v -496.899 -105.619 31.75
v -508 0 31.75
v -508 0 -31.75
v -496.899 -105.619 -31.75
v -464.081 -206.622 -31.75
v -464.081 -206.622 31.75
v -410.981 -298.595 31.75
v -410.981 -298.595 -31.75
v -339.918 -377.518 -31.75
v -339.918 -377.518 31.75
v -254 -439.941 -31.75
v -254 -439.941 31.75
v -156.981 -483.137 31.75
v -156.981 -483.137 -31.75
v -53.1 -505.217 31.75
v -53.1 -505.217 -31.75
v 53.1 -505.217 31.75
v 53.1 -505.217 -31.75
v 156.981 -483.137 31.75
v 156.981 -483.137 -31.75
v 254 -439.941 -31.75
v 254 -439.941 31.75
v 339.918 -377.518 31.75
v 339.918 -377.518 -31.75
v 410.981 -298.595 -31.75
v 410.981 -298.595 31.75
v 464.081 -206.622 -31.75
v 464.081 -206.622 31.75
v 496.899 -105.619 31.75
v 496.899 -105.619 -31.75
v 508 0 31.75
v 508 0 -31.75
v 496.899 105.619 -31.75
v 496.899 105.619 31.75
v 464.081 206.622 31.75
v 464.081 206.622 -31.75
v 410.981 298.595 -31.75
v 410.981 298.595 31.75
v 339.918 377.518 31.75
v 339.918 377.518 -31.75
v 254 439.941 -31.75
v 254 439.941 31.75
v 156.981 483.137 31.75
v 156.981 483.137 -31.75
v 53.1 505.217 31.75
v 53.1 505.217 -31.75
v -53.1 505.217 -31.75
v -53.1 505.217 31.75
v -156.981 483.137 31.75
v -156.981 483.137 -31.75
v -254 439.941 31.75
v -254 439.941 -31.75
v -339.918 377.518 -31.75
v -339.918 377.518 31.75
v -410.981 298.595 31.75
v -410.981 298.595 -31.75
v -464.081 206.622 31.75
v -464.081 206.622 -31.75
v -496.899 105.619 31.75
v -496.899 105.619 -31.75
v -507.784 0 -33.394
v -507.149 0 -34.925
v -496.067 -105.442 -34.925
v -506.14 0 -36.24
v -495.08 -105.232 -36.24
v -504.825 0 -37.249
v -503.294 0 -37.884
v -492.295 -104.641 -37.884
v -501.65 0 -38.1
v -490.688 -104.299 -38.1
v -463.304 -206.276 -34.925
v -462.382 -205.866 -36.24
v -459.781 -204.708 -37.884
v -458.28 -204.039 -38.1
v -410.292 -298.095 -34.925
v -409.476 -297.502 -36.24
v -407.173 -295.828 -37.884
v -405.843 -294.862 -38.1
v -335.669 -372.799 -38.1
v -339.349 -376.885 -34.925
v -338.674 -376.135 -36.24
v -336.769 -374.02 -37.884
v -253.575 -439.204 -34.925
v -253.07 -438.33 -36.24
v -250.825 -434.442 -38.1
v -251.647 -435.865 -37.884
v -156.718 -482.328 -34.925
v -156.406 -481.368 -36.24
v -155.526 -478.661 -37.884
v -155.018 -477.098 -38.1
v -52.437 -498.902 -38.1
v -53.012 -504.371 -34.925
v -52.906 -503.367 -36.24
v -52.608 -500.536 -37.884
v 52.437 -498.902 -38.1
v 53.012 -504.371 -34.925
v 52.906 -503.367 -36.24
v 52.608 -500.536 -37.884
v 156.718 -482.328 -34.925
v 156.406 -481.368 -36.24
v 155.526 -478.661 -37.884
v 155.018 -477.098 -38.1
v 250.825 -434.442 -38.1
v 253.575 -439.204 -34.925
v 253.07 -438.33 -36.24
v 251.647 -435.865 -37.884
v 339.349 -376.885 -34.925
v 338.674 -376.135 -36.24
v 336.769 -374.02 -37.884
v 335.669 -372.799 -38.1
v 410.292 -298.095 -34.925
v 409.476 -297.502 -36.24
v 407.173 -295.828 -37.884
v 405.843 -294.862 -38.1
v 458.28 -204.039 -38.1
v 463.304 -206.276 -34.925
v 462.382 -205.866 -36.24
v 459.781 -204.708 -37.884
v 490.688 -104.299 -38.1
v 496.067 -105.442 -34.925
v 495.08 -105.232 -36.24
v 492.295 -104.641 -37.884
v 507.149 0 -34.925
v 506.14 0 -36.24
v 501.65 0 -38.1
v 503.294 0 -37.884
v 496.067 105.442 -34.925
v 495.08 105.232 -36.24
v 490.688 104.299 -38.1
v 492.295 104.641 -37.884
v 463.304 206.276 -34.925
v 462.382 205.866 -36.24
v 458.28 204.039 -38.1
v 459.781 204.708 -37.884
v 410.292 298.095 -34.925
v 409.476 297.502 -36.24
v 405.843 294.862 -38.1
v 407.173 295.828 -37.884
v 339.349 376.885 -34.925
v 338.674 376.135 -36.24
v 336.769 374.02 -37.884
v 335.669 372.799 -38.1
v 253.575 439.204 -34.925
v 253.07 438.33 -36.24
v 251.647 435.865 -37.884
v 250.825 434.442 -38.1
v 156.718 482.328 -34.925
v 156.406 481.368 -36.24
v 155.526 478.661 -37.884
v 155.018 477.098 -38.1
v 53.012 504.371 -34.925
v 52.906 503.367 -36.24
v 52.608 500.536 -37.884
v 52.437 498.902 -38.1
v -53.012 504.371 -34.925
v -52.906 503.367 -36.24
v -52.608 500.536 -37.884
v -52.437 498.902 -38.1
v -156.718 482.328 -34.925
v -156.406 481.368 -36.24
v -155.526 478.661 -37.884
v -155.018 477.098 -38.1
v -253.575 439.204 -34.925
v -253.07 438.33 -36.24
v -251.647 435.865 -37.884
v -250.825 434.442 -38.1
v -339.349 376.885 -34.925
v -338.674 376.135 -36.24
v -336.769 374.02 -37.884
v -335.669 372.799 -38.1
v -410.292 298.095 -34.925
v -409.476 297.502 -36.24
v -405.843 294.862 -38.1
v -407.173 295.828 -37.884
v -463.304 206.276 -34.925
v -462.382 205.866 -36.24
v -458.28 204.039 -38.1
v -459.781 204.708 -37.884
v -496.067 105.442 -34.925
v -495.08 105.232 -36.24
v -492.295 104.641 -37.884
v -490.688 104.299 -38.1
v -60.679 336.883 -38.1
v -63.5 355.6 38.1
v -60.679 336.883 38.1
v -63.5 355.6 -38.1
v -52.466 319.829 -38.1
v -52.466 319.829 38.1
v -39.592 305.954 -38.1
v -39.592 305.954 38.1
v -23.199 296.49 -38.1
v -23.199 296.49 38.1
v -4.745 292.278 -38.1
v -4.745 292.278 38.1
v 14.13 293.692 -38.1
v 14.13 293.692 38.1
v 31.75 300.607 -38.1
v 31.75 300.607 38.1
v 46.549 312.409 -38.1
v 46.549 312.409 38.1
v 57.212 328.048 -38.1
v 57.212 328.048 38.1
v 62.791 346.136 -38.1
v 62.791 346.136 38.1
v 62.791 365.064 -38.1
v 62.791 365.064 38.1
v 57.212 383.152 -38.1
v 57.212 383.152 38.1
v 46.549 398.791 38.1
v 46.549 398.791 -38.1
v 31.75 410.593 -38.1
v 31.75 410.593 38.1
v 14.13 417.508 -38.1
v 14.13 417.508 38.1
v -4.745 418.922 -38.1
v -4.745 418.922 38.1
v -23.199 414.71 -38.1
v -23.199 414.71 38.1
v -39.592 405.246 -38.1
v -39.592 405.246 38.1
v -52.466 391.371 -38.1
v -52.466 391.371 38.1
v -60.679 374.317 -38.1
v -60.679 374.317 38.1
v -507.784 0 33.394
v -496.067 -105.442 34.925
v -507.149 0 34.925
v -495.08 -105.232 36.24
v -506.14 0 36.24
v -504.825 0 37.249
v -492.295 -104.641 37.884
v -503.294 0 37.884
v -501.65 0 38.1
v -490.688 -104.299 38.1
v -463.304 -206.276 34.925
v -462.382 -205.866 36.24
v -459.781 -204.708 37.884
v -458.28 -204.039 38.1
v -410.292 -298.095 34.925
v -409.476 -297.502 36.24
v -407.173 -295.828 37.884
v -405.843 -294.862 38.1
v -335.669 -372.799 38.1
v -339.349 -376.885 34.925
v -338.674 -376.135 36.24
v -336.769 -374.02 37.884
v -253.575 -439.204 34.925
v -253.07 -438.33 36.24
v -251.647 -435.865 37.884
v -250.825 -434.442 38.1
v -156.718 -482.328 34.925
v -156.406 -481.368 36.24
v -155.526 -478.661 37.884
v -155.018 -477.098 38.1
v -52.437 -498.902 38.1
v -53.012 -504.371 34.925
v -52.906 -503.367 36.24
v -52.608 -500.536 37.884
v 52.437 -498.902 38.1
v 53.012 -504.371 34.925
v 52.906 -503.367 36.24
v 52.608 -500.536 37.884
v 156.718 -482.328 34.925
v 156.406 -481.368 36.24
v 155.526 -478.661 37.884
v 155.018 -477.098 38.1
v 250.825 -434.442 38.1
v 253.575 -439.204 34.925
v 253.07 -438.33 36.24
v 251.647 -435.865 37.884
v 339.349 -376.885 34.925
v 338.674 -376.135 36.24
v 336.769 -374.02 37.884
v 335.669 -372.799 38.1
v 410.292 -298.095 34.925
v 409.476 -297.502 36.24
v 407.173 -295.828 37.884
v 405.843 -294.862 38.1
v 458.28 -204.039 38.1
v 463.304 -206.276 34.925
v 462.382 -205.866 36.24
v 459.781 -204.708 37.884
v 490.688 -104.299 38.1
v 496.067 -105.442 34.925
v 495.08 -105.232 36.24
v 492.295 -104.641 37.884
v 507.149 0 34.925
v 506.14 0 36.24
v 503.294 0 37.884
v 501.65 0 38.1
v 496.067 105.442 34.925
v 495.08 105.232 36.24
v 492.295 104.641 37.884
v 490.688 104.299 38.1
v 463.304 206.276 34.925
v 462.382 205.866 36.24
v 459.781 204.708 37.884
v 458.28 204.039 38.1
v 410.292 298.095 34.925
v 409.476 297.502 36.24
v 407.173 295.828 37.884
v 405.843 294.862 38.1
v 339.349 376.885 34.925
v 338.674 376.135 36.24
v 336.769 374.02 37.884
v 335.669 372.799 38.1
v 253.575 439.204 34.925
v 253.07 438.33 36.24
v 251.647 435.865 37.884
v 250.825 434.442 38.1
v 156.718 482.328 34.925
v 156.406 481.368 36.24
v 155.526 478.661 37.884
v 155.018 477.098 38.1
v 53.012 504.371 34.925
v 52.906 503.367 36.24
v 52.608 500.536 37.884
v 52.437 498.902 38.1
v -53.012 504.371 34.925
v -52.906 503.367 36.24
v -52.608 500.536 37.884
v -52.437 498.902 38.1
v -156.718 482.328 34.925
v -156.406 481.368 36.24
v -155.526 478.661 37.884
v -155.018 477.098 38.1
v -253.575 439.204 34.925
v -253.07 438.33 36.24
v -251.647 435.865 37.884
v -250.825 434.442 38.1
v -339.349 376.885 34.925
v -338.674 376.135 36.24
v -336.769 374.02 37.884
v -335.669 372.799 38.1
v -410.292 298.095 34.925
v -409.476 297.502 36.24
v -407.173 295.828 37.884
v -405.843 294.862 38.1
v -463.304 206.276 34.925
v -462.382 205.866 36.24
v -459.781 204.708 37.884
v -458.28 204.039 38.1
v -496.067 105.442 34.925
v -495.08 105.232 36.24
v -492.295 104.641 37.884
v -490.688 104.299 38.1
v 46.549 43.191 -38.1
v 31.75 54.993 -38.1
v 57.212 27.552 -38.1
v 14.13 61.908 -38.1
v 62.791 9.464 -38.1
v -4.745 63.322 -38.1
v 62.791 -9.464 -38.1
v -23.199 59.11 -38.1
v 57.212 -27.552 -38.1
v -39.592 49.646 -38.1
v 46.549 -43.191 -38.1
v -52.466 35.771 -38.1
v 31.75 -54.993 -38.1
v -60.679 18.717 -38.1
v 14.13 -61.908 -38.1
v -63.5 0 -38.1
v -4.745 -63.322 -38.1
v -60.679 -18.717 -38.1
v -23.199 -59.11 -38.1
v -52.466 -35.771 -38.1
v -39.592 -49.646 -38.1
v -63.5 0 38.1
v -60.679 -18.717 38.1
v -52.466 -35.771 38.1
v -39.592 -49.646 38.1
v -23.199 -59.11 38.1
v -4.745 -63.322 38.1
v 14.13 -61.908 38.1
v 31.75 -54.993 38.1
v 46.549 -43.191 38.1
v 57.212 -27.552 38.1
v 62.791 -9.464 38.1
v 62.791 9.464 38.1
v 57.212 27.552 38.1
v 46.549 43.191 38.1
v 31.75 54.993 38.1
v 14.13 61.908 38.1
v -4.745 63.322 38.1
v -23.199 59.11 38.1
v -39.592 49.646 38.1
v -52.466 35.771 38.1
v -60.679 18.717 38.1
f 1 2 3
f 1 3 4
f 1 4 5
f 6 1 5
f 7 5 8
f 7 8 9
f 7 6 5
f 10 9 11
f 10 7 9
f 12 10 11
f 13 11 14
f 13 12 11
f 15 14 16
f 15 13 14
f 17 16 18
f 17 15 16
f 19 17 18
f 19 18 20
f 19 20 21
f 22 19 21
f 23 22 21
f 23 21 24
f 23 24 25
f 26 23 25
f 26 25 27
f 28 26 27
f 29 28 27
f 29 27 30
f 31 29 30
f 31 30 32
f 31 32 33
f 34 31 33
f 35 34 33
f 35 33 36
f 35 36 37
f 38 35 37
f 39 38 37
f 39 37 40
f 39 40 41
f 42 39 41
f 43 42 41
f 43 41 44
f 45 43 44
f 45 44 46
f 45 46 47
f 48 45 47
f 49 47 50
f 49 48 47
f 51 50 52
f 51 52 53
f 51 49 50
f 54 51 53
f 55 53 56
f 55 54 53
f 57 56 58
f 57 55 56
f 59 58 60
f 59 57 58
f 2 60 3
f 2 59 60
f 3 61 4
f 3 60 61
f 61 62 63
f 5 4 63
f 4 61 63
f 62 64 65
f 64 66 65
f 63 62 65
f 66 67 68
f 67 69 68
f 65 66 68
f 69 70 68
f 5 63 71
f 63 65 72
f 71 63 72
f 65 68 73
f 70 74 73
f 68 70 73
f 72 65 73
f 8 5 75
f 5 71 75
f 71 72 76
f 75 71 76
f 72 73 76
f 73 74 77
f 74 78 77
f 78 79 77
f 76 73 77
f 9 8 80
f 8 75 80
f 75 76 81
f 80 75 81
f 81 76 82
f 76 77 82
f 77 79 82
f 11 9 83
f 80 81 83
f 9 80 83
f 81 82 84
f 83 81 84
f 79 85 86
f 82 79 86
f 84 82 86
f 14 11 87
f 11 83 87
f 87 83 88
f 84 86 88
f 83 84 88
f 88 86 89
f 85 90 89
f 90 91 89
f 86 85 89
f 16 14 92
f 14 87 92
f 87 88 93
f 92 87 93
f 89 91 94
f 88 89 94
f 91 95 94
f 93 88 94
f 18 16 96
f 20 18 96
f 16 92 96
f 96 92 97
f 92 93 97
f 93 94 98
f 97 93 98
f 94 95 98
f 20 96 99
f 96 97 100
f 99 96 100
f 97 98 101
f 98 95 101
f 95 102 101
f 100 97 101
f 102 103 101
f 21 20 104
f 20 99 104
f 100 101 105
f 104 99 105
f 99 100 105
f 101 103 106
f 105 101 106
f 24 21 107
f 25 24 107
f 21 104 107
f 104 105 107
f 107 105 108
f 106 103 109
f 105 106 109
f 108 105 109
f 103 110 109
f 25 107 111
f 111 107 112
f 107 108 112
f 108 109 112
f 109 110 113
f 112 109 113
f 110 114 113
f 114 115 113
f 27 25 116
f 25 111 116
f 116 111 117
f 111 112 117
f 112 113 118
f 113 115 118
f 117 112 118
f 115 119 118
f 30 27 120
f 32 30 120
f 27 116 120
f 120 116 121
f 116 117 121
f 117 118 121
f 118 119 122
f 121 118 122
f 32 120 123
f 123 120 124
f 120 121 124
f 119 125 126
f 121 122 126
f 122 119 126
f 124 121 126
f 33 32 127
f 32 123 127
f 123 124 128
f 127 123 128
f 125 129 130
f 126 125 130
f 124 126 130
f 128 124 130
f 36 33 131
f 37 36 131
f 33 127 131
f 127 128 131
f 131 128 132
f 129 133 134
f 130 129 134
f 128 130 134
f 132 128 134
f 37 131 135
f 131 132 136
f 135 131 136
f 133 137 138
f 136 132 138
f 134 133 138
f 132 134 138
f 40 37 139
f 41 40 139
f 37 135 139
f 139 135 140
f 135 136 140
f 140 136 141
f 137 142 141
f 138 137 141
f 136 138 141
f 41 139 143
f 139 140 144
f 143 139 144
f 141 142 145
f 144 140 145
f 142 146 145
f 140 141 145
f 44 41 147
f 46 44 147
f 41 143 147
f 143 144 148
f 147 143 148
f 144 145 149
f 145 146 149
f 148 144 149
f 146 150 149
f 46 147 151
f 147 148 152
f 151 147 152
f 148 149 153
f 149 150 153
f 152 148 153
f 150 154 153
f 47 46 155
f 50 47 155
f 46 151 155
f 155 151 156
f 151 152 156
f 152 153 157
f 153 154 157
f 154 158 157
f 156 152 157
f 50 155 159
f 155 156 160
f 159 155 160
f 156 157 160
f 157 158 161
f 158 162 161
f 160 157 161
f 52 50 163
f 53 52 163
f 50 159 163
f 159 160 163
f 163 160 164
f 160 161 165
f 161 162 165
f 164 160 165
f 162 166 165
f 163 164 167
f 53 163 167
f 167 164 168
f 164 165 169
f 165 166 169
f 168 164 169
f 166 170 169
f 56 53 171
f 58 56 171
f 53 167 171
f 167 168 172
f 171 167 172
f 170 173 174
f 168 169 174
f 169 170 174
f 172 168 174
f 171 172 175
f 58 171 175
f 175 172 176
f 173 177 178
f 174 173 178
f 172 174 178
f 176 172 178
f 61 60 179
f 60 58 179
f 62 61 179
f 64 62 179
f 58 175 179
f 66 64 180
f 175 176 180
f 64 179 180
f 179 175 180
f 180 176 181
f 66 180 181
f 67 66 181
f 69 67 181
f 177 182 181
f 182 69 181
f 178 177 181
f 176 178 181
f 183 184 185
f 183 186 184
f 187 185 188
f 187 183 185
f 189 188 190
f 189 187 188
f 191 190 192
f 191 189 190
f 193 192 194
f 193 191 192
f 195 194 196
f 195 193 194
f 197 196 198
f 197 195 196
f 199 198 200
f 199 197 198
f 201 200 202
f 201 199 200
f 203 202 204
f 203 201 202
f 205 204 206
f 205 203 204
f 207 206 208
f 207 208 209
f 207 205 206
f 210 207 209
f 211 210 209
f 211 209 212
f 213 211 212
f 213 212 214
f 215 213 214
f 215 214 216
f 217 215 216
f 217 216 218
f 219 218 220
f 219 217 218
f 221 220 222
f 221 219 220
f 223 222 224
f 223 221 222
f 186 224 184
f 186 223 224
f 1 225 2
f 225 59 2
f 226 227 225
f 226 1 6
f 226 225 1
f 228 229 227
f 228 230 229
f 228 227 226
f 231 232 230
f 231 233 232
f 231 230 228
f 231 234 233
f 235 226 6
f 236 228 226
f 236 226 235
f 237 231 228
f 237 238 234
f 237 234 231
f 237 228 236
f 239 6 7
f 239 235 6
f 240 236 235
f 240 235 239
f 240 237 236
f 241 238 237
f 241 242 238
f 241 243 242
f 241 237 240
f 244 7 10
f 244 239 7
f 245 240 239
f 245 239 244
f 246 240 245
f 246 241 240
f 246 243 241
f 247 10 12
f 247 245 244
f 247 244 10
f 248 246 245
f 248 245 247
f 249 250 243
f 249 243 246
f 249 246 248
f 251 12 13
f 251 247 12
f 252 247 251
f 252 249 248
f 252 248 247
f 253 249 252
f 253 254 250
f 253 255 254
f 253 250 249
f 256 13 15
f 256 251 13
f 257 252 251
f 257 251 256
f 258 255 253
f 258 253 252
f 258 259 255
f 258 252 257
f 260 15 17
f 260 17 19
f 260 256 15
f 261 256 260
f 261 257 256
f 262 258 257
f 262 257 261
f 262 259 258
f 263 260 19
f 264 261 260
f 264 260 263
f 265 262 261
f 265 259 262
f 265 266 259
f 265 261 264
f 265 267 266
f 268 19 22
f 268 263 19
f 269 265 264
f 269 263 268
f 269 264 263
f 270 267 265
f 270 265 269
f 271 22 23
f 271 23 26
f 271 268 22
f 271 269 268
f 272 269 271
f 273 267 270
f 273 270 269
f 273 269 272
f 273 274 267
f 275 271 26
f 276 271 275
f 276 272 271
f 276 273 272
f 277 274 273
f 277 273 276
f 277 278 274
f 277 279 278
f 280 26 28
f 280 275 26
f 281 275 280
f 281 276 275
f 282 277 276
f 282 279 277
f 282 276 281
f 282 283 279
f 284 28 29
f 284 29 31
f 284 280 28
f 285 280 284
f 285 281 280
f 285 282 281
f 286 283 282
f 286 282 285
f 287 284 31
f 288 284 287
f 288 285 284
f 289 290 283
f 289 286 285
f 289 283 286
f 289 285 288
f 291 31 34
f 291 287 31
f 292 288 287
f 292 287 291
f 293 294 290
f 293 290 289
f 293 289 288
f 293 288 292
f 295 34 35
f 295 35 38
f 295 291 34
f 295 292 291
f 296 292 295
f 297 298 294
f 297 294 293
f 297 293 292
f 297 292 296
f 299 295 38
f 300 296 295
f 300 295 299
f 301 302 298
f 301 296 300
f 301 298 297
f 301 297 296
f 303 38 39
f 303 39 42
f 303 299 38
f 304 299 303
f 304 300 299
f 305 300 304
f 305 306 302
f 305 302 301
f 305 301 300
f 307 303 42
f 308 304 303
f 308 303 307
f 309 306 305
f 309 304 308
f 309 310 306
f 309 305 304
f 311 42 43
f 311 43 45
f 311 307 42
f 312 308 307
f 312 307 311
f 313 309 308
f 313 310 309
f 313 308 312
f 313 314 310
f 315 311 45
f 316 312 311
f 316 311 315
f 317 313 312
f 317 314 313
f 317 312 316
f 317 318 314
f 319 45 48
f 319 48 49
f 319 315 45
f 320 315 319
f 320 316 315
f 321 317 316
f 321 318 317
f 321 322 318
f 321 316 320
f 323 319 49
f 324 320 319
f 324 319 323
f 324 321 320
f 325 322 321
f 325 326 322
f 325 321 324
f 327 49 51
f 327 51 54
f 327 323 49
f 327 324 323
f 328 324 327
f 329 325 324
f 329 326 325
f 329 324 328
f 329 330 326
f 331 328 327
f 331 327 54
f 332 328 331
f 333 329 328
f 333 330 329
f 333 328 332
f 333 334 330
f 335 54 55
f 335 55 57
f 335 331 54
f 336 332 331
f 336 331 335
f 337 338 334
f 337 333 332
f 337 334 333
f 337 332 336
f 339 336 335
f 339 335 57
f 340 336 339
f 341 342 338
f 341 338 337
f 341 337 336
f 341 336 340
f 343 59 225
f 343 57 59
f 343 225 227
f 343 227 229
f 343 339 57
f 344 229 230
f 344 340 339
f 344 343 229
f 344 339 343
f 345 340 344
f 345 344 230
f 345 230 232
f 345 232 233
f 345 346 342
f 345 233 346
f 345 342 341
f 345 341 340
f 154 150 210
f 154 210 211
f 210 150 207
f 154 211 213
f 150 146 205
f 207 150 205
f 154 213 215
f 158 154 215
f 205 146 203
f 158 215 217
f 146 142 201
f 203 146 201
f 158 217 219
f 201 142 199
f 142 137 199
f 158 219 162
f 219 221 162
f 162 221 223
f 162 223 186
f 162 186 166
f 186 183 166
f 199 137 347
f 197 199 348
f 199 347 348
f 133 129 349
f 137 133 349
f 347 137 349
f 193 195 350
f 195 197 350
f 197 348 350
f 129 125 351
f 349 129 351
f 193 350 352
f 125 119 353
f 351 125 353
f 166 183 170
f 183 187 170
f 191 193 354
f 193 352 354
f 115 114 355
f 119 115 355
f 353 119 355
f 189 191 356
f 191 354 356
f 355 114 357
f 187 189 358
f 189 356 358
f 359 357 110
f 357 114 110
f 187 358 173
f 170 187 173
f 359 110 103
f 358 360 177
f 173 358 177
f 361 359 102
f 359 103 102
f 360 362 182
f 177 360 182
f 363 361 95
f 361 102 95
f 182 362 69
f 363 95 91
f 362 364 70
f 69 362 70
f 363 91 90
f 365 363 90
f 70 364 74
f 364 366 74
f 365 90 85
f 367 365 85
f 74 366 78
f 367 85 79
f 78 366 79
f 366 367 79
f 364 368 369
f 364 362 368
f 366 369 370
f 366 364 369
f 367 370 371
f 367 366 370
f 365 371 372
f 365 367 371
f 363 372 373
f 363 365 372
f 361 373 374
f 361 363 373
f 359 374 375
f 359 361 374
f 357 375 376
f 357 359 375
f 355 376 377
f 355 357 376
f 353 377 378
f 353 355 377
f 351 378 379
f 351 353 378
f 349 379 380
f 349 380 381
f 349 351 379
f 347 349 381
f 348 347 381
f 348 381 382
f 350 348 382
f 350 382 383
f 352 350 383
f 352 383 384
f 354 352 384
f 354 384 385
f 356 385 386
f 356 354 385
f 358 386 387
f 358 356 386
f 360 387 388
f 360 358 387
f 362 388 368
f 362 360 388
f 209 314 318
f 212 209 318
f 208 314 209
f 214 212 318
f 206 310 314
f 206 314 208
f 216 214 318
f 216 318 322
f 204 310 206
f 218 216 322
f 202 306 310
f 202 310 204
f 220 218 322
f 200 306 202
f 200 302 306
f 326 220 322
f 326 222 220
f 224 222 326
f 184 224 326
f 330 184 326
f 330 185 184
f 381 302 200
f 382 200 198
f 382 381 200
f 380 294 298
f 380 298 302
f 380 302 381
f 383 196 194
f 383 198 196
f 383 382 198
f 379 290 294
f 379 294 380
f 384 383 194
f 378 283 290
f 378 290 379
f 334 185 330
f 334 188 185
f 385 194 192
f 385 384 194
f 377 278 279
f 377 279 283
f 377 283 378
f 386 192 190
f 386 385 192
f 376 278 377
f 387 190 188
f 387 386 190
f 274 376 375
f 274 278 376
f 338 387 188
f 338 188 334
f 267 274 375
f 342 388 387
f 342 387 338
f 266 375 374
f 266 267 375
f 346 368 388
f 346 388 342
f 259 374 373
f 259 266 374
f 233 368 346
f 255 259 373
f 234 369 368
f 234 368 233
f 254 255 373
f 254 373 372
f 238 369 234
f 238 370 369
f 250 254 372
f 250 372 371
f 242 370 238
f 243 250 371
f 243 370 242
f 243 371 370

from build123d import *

# Parameters (mm, degrees)
SKETCH1_R           = 508
SKETCH1_R_2         = 63.5
BOSS_EXTRUDE1_DEPTH = 38.1
FILLET1_R           = 6.35


with BuildPart() as part:
    # Sketch1 → Boss-Extrude1 (new, symmetric)
    with BuildSketch(Plane.XY):
        with Locations(Location((0, 0, 0), (0, 0, 180))):
            Circle(SKETCH1_R)
        with Locations(Location((0, 0, 0), (0, 0, 180))):
            Circle(SKETCH1_R_2, mode=Mode.SUBTRACT)
        with Locations(Location((0, 355.6, 0), (0, 0, 180))):
            Circle(SKETCH1_R_2, mode=Mode.SUBTRACT)
    extrude(amount=BOSS_EXTRUDE1_DEPTH, both=True)

    # Fillet1
    fillet1_edges = [part.edges().sort_by_distance(p)[0] for p in [
        (508, 0, -38.1),
        (508, 0, 38.1),
    ]]
    fillet(fillet1_edges, radius=FILLET1_R)


solid = part.part
